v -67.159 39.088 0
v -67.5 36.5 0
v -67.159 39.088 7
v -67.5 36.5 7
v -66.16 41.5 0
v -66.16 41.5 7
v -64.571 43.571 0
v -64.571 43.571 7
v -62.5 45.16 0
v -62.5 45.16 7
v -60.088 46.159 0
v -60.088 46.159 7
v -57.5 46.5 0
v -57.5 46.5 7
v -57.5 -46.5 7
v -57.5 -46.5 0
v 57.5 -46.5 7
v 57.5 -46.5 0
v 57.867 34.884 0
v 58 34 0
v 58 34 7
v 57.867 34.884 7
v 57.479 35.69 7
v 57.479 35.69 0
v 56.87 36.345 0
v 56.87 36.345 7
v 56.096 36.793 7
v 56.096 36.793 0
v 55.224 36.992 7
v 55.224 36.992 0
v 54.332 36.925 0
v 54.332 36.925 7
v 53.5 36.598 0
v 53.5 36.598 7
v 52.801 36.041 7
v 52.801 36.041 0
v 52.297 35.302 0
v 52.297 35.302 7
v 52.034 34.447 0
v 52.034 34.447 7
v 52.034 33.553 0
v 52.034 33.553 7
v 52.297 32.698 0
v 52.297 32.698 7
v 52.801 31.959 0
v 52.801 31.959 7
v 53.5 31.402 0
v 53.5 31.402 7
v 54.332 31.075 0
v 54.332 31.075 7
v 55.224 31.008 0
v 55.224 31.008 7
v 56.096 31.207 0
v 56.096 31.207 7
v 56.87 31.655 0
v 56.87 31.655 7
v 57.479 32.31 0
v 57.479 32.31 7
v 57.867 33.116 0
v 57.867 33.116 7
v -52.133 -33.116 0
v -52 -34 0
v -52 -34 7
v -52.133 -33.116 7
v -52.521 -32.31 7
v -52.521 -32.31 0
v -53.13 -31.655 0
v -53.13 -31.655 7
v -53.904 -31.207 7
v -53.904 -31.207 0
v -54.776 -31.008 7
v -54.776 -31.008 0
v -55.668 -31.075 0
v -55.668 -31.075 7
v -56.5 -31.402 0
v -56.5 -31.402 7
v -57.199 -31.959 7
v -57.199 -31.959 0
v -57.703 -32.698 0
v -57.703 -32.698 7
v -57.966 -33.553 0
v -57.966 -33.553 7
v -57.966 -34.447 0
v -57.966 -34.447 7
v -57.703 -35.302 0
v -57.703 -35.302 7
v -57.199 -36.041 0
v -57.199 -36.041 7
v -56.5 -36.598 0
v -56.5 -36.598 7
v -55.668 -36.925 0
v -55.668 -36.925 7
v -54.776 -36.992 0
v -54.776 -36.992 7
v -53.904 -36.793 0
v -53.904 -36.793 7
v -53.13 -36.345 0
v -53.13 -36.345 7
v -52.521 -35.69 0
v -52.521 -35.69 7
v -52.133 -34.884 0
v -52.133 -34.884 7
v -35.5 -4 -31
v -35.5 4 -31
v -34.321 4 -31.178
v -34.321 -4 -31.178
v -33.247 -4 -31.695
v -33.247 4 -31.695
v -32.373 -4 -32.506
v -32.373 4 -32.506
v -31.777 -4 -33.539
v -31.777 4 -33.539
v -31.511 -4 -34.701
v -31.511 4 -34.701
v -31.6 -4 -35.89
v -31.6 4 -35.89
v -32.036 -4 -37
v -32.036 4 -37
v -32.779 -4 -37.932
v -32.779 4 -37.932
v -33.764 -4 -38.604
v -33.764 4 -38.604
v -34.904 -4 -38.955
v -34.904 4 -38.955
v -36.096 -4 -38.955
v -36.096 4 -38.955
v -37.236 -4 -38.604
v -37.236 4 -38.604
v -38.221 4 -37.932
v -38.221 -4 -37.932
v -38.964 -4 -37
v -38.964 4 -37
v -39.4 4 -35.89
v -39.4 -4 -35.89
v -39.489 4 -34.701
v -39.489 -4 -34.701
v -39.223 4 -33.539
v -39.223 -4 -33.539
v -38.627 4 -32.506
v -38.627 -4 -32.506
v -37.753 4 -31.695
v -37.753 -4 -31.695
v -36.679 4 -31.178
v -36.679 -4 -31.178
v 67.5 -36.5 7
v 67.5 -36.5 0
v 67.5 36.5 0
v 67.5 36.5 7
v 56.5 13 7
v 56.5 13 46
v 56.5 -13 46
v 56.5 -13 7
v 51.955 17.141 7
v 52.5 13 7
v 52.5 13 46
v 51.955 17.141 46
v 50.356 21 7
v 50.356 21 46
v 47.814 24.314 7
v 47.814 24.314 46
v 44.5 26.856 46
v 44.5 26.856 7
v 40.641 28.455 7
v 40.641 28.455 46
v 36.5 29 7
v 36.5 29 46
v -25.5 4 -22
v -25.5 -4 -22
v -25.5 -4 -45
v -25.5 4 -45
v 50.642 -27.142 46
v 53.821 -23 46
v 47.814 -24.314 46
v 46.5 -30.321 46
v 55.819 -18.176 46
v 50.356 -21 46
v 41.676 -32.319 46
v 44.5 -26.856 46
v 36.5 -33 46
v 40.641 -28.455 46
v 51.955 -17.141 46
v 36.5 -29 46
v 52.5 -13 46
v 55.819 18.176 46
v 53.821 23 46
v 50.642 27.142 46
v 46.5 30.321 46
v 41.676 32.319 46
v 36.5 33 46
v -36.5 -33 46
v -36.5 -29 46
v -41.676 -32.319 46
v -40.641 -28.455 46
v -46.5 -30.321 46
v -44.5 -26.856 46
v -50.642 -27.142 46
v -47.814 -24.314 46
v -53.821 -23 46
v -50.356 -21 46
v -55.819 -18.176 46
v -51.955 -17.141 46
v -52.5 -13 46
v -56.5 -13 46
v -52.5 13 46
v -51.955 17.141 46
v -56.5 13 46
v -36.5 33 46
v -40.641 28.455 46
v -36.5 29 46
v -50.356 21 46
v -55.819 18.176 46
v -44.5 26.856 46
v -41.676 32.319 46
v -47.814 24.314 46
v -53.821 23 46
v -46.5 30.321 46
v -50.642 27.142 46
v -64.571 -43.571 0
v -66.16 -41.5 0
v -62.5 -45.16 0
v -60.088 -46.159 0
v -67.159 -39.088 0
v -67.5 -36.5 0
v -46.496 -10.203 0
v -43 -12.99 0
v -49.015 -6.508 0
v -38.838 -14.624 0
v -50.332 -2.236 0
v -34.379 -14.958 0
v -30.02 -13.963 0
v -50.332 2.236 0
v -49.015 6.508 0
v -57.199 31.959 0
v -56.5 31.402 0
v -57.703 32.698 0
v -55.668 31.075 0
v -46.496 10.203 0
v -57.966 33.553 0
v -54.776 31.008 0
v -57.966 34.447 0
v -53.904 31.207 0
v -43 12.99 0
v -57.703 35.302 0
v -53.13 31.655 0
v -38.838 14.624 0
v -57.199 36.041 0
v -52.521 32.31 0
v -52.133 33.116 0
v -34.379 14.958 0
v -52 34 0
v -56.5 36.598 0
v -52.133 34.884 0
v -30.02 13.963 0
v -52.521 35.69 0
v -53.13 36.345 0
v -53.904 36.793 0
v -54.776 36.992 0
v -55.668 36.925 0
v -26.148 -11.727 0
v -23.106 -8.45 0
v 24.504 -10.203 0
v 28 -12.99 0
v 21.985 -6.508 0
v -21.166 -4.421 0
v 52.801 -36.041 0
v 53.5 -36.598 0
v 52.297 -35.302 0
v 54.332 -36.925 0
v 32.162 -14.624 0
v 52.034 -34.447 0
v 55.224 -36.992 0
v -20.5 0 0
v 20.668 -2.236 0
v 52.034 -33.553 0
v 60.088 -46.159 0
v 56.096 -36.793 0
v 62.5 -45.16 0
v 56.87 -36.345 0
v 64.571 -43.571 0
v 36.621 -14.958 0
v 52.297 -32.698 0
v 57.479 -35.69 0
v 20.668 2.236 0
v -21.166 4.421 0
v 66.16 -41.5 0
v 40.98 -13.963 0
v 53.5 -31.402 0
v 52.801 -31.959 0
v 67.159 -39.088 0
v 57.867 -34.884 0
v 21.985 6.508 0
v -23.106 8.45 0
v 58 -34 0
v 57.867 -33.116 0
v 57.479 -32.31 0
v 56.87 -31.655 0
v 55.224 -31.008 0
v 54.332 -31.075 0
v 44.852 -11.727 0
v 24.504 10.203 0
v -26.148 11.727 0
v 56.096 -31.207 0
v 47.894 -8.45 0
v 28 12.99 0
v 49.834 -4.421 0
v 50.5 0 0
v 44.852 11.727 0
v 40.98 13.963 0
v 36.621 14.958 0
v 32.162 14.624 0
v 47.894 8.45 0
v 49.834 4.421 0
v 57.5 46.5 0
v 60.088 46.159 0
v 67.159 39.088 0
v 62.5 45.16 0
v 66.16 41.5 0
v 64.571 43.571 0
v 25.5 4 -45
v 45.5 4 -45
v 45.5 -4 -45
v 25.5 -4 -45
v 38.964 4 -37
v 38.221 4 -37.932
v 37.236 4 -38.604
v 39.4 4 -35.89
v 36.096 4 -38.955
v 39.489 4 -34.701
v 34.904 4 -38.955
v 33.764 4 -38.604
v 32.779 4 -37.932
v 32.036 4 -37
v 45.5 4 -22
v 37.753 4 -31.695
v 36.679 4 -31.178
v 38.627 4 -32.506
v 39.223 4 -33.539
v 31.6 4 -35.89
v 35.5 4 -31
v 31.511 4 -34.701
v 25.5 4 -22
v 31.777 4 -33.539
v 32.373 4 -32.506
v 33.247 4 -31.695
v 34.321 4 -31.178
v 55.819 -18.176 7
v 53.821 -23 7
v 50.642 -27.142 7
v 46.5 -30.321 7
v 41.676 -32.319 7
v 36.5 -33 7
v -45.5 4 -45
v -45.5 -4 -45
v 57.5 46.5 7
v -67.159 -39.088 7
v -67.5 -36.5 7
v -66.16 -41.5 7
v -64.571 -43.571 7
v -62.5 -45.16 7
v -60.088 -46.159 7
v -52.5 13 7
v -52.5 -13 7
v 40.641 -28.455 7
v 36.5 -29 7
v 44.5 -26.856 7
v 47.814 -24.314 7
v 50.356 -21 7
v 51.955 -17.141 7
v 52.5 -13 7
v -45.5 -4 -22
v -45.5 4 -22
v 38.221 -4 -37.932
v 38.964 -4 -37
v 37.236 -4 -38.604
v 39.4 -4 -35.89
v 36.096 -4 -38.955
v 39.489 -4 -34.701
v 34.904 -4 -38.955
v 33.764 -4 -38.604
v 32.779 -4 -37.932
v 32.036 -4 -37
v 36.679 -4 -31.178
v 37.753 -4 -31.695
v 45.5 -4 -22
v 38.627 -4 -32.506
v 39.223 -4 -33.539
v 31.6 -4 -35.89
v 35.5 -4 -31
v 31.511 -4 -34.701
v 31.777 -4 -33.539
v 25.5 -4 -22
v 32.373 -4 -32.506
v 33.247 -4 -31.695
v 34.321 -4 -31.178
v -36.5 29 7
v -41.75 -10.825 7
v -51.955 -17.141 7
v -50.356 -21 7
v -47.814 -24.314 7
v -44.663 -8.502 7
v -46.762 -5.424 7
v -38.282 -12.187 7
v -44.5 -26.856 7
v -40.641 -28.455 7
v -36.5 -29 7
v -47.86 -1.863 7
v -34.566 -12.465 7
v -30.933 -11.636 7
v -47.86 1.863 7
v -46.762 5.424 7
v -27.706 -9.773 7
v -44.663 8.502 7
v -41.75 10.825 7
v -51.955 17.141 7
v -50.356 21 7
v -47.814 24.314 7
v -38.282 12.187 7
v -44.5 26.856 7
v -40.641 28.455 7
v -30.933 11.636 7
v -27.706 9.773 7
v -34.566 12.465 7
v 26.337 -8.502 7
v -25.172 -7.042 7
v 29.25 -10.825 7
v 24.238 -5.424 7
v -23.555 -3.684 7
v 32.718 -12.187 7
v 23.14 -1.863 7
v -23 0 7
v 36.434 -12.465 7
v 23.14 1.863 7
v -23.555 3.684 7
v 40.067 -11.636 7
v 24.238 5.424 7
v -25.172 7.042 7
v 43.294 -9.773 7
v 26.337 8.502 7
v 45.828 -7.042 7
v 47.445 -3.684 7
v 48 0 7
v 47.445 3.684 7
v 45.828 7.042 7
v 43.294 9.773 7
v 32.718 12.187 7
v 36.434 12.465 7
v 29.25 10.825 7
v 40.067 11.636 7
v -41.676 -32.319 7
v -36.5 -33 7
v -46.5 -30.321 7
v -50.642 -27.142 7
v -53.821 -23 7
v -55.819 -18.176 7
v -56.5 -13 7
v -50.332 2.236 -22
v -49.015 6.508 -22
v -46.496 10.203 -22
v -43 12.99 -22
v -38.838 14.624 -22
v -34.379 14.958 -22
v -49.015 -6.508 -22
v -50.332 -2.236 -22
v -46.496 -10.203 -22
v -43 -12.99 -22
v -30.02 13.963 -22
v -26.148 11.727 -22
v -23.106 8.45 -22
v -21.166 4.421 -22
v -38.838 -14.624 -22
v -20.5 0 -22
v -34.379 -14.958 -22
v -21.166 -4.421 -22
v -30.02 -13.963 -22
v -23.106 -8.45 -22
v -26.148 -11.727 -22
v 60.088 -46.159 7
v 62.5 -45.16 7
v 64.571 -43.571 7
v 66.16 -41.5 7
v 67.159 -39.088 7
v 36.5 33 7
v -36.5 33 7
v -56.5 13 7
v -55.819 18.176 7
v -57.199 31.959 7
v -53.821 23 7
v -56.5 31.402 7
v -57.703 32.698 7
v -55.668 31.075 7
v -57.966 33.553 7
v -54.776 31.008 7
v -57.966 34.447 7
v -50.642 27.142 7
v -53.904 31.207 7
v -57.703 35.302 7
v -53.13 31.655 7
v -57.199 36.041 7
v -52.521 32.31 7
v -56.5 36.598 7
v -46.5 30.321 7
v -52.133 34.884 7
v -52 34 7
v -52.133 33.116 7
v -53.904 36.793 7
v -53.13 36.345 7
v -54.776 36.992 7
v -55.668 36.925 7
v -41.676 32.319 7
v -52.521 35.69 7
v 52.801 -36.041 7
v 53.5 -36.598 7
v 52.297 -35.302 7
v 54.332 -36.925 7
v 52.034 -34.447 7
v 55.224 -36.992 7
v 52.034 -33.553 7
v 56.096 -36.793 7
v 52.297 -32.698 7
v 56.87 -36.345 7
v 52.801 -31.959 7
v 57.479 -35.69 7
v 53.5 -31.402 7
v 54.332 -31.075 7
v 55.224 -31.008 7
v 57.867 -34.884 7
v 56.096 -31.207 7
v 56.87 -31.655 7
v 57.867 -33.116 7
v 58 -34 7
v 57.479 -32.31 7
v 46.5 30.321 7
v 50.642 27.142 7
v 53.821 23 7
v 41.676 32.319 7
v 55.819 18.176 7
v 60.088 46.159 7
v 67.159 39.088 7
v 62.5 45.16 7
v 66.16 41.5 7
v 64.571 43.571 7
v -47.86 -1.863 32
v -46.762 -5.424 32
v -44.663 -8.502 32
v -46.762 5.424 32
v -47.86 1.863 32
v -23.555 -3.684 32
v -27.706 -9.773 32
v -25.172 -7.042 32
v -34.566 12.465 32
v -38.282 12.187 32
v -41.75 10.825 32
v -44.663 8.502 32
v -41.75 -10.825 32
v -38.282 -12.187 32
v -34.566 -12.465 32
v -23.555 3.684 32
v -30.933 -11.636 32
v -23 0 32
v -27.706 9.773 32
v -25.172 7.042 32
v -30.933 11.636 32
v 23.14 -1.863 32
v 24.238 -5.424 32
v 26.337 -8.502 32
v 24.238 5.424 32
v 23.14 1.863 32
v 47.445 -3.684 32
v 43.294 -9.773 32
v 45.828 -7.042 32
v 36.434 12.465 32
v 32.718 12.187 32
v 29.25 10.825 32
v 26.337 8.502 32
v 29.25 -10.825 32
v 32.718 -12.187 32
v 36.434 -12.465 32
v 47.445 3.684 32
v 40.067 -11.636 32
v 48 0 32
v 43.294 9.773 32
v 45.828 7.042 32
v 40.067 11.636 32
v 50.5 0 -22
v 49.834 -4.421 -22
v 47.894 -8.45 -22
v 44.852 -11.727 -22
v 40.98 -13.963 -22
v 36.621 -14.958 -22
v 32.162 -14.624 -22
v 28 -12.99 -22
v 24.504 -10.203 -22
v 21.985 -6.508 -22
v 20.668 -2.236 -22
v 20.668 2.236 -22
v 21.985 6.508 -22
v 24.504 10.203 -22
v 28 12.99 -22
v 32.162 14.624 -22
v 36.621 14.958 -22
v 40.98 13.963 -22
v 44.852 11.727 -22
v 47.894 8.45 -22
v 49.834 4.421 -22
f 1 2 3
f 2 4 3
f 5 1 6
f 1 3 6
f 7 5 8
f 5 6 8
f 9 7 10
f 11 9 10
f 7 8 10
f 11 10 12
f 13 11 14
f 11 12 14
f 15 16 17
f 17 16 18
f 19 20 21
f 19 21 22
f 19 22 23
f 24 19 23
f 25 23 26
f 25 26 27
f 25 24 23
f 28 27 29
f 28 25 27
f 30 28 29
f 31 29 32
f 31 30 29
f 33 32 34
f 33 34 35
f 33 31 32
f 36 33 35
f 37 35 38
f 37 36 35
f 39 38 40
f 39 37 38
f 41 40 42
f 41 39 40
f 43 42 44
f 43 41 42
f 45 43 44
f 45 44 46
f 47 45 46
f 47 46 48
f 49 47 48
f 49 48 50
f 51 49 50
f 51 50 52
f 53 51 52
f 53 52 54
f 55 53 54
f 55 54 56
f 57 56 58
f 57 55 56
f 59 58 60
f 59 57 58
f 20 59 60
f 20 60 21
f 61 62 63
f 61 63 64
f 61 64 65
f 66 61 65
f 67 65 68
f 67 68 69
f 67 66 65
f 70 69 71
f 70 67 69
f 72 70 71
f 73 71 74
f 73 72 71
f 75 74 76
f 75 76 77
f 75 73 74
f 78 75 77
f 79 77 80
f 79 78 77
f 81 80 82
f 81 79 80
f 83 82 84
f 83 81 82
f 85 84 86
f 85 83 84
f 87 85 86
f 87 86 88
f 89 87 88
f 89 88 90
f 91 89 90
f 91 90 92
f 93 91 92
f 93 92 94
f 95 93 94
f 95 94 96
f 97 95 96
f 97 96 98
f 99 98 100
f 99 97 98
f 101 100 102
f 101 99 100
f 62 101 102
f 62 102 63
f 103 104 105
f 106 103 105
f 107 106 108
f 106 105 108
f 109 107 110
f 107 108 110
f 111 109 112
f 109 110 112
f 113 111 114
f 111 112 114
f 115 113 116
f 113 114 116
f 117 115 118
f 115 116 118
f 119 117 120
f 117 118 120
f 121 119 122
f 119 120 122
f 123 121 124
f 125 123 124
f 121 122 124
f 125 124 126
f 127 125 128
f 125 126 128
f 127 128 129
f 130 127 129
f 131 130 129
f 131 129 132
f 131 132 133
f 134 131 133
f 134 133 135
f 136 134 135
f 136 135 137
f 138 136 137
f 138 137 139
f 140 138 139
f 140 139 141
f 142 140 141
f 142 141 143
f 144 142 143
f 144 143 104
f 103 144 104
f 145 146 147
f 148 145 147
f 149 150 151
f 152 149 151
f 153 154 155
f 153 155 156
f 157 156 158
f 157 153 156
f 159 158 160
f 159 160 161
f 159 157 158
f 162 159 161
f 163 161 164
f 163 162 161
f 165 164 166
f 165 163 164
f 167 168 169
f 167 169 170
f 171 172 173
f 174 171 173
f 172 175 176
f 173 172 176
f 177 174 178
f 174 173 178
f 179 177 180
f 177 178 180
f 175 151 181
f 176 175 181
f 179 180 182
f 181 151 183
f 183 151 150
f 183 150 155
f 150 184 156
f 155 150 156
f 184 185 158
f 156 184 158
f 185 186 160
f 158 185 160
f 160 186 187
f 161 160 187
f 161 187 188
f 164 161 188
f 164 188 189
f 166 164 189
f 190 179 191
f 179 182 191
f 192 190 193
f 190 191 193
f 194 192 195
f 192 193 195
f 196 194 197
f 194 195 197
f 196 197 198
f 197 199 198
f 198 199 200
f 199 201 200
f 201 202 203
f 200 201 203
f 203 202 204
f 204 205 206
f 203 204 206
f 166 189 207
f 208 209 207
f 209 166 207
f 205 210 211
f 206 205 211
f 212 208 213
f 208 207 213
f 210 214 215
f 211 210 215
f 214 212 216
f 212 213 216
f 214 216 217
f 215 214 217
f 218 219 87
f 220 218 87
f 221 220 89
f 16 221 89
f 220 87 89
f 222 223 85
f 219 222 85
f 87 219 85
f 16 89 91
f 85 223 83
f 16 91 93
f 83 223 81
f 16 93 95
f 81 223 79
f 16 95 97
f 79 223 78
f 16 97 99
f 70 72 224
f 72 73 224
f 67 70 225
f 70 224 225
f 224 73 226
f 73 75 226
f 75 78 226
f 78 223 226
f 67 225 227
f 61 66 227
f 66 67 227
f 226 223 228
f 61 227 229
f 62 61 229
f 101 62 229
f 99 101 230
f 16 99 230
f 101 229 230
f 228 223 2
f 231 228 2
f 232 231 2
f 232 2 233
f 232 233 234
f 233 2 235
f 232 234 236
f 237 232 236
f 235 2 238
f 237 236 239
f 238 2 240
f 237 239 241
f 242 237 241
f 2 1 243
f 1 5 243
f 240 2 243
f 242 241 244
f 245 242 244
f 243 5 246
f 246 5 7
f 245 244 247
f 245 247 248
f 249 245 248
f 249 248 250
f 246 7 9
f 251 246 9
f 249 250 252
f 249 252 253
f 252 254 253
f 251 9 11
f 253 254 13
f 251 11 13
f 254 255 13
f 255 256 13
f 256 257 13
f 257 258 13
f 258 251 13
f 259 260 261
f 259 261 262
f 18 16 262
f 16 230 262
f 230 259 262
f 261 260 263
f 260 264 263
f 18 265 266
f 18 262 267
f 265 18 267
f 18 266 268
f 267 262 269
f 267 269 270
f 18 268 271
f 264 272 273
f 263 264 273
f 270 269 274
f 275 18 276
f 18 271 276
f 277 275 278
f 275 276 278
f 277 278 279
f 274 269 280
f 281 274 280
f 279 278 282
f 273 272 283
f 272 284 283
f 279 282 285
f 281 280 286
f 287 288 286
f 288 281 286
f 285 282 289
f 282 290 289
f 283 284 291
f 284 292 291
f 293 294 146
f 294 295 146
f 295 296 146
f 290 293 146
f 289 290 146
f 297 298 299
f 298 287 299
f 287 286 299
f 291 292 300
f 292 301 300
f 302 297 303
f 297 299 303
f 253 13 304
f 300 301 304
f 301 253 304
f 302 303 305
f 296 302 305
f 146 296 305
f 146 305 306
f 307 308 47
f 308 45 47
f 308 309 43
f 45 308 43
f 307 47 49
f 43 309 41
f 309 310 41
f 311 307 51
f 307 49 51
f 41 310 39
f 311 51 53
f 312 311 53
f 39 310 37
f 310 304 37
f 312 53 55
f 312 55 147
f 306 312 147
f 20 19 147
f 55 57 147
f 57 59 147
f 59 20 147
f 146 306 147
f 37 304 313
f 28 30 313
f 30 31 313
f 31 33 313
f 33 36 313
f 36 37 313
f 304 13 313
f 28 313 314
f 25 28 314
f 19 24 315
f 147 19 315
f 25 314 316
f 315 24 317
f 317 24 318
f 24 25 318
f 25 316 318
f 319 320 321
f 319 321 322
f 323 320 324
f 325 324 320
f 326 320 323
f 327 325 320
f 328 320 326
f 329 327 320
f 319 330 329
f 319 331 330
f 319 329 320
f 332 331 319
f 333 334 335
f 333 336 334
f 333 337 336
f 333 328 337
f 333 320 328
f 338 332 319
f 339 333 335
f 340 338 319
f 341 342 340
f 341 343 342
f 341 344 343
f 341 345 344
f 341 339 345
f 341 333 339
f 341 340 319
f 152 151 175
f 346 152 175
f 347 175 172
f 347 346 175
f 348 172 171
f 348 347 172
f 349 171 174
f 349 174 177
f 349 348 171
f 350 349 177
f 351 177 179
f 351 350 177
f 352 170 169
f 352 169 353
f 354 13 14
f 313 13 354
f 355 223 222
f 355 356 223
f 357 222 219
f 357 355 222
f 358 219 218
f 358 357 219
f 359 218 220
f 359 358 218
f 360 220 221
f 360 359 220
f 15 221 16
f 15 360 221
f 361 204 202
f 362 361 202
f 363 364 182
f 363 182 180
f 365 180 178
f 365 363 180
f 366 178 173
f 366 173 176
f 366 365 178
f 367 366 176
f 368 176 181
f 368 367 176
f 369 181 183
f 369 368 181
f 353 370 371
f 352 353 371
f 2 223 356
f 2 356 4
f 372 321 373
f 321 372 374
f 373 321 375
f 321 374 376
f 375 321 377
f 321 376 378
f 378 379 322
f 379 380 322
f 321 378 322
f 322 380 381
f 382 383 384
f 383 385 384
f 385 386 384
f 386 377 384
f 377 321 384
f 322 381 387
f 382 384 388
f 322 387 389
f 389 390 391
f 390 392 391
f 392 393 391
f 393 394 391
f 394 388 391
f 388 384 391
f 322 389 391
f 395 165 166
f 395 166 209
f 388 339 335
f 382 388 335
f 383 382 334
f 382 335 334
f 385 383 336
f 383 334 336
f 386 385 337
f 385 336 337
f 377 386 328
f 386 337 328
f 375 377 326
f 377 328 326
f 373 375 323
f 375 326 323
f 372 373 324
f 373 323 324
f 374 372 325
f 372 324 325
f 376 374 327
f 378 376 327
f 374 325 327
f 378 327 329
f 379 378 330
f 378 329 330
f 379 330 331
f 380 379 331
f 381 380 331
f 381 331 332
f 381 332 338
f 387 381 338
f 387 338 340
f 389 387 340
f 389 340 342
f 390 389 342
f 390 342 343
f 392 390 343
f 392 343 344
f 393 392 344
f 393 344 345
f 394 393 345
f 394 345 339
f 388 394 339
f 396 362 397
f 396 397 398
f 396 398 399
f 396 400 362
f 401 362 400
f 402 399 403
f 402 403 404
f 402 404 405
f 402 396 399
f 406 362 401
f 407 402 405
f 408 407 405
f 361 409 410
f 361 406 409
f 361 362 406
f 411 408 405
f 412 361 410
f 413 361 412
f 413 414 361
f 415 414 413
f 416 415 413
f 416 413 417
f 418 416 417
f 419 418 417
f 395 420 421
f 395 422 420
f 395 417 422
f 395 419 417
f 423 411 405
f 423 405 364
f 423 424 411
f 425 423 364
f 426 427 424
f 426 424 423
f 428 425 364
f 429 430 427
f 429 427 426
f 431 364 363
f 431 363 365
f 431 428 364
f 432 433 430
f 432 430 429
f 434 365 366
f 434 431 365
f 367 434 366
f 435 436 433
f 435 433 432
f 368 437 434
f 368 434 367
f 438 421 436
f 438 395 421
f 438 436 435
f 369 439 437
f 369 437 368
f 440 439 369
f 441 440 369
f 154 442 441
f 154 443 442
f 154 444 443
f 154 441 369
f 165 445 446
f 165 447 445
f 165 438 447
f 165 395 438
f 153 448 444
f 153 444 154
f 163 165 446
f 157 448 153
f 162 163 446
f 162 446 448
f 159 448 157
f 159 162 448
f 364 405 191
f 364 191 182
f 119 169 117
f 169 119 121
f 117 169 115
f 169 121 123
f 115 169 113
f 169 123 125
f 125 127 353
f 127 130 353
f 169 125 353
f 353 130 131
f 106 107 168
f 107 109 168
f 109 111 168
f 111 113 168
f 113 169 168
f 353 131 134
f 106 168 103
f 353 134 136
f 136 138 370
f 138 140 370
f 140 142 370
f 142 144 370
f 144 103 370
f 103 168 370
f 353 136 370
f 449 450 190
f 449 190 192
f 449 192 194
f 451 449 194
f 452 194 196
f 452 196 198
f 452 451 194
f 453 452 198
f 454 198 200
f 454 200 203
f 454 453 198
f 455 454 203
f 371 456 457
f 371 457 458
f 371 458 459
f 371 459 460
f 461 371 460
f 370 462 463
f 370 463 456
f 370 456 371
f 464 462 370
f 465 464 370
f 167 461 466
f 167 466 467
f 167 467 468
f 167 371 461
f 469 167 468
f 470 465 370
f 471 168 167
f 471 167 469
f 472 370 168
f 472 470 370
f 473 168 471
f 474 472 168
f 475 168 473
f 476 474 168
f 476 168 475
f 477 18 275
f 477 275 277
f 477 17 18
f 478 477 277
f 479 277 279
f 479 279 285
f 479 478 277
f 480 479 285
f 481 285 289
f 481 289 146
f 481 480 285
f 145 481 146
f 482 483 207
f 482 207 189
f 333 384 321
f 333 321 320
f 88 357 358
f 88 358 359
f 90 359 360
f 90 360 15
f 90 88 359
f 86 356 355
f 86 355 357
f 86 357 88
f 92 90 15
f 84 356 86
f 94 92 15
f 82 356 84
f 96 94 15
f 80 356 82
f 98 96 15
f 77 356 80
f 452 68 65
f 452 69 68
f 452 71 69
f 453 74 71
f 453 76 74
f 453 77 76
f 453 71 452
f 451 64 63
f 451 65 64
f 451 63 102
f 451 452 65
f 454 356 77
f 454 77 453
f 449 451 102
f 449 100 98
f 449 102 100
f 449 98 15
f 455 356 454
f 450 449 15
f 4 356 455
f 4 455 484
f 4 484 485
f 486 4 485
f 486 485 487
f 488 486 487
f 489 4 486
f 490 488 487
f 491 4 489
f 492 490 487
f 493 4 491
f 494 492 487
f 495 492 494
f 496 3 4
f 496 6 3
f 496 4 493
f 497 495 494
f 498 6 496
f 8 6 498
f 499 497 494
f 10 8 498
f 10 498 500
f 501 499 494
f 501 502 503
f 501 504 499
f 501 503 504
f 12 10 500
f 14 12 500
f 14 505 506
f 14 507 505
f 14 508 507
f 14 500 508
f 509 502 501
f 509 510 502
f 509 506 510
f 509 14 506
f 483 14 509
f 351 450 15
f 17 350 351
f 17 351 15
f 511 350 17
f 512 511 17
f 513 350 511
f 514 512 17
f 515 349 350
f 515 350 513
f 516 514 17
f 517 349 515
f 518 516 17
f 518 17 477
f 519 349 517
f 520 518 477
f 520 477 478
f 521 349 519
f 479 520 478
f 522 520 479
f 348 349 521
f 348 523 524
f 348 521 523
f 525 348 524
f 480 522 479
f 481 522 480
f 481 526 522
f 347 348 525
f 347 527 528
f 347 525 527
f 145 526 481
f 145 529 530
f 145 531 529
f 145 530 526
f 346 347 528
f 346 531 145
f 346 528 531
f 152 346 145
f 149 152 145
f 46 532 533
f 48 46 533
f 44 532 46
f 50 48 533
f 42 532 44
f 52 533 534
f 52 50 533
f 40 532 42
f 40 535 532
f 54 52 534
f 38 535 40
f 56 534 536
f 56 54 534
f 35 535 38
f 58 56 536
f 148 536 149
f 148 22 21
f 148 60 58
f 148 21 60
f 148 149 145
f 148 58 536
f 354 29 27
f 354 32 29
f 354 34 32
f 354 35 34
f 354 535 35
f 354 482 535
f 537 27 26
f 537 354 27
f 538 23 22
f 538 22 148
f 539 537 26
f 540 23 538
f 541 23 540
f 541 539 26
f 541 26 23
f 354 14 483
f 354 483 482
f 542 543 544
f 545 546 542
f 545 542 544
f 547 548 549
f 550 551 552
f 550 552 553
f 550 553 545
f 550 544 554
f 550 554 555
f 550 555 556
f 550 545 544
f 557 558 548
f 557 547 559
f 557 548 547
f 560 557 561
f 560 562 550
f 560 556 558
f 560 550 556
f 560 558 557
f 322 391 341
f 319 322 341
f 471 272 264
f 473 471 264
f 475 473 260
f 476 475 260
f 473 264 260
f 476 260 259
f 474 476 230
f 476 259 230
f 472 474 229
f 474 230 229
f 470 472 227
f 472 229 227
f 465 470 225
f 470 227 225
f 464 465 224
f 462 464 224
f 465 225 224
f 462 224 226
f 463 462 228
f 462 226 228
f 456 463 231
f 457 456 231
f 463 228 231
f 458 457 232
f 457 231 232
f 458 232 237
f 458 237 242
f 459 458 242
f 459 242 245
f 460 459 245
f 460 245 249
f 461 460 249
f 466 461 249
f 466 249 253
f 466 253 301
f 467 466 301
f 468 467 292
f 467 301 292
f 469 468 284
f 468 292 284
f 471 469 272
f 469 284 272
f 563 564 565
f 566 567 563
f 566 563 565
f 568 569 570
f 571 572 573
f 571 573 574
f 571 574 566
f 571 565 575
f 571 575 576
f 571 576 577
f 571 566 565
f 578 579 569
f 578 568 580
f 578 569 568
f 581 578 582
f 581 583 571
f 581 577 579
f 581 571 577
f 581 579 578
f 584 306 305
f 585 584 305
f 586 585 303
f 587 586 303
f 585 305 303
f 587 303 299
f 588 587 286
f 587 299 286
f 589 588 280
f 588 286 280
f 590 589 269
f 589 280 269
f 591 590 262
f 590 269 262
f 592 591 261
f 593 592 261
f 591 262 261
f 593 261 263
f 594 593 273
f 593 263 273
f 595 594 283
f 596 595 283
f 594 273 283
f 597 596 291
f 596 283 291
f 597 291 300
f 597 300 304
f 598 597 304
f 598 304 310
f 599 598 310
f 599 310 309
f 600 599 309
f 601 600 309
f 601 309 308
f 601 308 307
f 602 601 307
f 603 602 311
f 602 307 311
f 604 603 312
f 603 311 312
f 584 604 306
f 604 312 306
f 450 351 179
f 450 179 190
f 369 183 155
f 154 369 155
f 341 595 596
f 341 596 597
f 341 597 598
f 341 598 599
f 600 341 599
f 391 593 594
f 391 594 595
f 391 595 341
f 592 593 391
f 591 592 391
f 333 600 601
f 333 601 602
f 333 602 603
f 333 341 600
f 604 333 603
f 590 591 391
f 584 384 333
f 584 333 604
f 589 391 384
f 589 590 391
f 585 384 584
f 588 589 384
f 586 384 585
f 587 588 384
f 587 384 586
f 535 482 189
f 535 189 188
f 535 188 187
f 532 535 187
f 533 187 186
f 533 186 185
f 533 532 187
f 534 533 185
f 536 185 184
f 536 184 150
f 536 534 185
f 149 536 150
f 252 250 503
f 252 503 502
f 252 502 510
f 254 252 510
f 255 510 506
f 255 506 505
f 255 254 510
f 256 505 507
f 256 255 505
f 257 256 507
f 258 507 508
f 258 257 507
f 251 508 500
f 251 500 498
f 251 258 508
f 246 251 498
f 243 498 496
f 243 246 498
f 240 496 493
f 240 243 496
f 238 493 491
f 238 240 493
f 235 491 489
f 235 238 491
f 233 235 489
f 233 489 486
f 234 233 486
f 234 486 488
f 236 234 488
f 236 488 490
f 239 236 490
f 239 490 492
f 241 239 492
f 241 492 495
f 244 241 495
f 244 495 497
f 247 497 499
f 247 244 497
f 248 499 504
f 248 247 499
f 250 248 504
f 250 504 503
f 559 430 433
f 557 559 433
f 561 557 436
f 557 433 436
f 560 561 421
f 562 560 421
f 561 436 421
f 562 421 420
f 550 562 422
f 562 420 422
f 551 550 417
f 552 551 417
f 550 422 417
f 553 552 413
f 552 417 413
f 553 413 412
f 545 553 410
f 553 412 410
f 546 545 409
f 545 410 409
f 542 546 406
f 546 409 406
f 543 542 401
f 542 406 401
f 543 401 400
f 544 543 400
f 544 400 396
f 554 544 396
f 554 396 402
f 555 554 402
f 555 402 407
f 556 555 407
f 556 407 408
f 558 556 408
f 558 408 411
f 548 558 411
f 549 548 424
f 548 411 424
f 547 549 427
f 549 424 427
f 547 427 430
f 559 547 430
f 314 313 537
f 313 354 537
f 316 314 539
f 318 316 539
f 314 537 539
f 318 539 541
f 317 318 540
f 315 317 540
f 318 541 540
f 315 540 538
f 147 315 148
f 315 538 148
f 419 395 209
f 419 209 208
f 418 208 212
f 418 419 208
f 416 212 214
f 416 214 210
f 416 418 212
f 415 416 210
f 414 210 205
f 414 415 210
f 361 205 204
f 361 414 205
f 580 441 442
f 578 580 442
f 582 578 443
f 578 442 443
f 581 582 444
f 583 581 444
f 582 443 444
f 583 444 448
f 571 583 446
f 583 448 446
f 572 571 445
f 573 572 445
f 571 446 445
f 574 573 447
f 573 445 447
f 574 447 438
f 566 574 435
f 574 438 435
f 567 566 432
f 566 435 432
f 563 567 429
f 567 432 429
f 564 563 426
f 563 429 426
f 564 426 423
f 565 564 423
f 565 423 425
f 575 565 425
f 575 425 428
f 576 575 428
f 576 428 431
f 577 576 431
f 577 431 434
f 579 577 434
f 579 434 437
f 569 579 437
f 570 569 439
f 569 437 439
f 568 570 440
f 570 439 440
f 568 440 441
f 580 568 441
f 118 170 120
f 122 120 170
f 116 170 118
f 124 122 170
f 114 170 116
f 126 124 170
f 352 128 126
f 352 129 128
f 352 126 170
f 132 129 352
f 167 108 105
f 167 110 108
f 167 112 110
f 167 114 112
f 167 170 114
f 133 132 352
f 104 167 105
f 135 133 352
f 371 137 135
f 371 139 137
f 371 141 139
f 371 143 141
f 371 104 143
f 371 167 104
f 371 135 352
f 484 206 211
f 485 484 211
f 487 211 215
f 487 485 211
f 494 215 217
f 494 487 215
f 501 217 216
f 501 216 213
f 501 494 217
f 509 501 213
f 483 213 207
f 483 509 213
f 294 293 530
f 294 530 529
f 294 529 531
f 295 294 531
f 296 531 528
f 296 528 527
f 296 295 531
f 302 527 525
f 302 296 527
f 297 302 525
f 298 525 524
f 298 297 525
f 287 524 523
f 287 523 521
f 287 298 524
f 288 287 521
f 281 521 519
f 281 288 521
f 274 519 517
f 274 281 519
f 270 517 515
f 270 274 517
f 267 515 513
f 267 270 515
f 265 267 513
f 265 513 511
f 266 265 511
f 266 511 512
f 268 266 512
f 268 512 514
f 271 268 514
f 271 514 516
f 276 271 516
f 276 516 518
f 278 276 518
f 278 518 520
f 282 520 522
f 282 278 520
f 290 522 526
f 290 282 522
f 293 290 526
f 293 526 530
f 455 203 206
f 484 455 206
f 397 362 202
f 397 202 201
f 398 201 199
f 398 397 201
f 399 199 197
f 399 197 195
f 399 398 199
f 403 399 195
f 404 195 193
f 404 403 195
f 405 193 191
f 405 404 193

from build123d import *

# Parameters (mm, degrees)
SKETCH1_W           = 135
SKETCH1_H           = 93
SKETCH1_R           = 3
BOSS_EXTRUDE1_DEPTH = 7
BOSS_EXTRUDE2_DEPTH = 39
FILLET1_R           = 10
SKETCH3_R           = 15
BOSS_EXTRUDE3_DEPTH = 22
SKETCH5_W           = 20
SKETCH5_H           = 8
BOSS_EXTRUDE4_DEPTH = 23
SKETCH6_R           = 4
CUT_EXTRUDE1_DEPTH  = 97.033848199
SKETCH7_R           = 12.5
BOSS_EXTRUDE5_DEPTH = 25


with BuildPart() as part:
    # Sketch1 → Boss-Extrude1 (new body)
    with BuildSketch(Plane.XY):
        Rectangle(SKETCH1_W, SKETCH1_H)
        with Locations((-55, 34)):
            Circle(SKETCH1_R, mode=Mode.SUBTRACT)
        with Locations((55, 34)):
            Circle(SKETCH1_R, mode=Mode.SUBTRACT)
        with Locations((55, -34)):
            Circle(SKETCH1_R, mode=Mode.SUBTRACT)
        with Locations((-55, -34)):
            Circle(SKETCH1_R, mode=Mode.SUBTRACT)
    extrude(amount=BOSS_EXTRUDE1_DEPTH)

    # Sketch2 → Boss-Extrude2 (add)
    with BuildSketch(Plane.XY.offset(7)):
        with BuildLine():
            Line((-36.5, 33), (36.5, 33))
            ThreePointArc((36.5, 33), (50.642135624, 27.142135624), (56.5, 13))
            Line((56.5, 13), (56.5, -13))
            ThreePointArc((56.5, -13), (50.642135624, -27.142135624), (36.5, -33))
            Line((36.5, -33), (-36.5, -33))
            ThreePointArc((-36.5, -33), (-50.642135624, -27.142135624), (-56.5, -13))
            Line((-56.5, -13), (-56.5, 13))
            ThreePointArc((-56.5, 13), (-50.642135624, 27.142135624), (-36.5, 33))
        make_face()
        with BuildLine():
            Line((-52.5, 13), (-52.5, -13))
            ThreePointArc((-52.5, -13), (-47.813708499, -24.313708499), (-36.5, -29))
            Line((-36.5, -29), (36.5, -29))
            ThreePointArc((36.5, -29), (47.813708499, -24.313708499), (52.5, -13))
            Line((52.5, -13), (52.5, 13))
            ThreePointArc((52.5, 13), (47.813708499, 24.313708499), (36.5, 29))
            Line((36.5, 29), (-36.5, 29))
            ThreePointArc((-36.5, 29), (-47.813708499, 24.313708499), (-52.5, 13))
        make_face(mode=Mode.SUBTRACT)
    extrude(amount=BOSS_EXTRUDE2_DEPTH)

    # Fillet1
    fillet1_edges = [part.edges().sort_by_distance(p)[0] for p in [
        (-67.5, -46.5, 3.5),
        (-67.5, 46.5, 3.5),
        (67.5, 46.5, 3.5),
        (67.5, -46.5, 3.5),
    ]]
    fillet(fillet1_edges, radius=FILLET1_R)

    # Sketch3 → Boss-Extrude3 (add)
    with BuildSketch(Plane(origin=(0, 0, 0), x_dir=(-1, 0, 0), z_dir=(0, 0, -1))):
        with Locations(Location((-35.5, 0, 0), (0, 0, 180))):
            Circle(SKETCH3_R)
        with Locations(Location((35.5, 0, 0), (0, 0, 180))):
            Circle(SKETCH3_R)
    extrude(amount=BOSS_EXTRUDE3_DEPTH)

    # Sketch5 → Boss-Extrude4 (add)
    with BuildSketch(Plane(origin=(0, 0, -22), x_dir=(-1, 0, 0), z_dir=(0, 0, -1))):
        with Locations((-35.5, 0)):
            Rectangle(SKETCH5_W, SKETCH5_H)
        with Locations((35.5, 0)):
            Rectangle(SKETCH5_W, SKETCH5_H)
    extrude(amount=BOSS_EXTRUDE4_DEPTH)

    # Sketch6 → Cut-Extrude1 (cut, through all)
    with BuildSketch(Plane(origin=(0, 4, 0), x_dir=(1, 0, 0), z_dir=(0, 1, 0))):
        with Locations(Location((35.5, 35, 0), (0, 0, 270))):
            Circle(SKETCH6_R)
        with Locations(Location((-35.5, 35, 0), (0, 0, 270))):
            Circle(SKETCH6_R)
    extrude(amount=-CUT_EXTRUDE1_DEPTH, mode=Mode.SUBTRACT)

    # Sketch7 → Boss-Extrude5 (add)
    with BuildSketch(Plane.XY.offset(7)):
        with Locations((-35.5, 0)):
            Circle(SKETCH7_R)
        with Locations((35.5, 0)):
            Circle(SKETCH7_R)
    extrude(amount=BOSS_EXTRUDE5_DEPTH)


solid = part.part
